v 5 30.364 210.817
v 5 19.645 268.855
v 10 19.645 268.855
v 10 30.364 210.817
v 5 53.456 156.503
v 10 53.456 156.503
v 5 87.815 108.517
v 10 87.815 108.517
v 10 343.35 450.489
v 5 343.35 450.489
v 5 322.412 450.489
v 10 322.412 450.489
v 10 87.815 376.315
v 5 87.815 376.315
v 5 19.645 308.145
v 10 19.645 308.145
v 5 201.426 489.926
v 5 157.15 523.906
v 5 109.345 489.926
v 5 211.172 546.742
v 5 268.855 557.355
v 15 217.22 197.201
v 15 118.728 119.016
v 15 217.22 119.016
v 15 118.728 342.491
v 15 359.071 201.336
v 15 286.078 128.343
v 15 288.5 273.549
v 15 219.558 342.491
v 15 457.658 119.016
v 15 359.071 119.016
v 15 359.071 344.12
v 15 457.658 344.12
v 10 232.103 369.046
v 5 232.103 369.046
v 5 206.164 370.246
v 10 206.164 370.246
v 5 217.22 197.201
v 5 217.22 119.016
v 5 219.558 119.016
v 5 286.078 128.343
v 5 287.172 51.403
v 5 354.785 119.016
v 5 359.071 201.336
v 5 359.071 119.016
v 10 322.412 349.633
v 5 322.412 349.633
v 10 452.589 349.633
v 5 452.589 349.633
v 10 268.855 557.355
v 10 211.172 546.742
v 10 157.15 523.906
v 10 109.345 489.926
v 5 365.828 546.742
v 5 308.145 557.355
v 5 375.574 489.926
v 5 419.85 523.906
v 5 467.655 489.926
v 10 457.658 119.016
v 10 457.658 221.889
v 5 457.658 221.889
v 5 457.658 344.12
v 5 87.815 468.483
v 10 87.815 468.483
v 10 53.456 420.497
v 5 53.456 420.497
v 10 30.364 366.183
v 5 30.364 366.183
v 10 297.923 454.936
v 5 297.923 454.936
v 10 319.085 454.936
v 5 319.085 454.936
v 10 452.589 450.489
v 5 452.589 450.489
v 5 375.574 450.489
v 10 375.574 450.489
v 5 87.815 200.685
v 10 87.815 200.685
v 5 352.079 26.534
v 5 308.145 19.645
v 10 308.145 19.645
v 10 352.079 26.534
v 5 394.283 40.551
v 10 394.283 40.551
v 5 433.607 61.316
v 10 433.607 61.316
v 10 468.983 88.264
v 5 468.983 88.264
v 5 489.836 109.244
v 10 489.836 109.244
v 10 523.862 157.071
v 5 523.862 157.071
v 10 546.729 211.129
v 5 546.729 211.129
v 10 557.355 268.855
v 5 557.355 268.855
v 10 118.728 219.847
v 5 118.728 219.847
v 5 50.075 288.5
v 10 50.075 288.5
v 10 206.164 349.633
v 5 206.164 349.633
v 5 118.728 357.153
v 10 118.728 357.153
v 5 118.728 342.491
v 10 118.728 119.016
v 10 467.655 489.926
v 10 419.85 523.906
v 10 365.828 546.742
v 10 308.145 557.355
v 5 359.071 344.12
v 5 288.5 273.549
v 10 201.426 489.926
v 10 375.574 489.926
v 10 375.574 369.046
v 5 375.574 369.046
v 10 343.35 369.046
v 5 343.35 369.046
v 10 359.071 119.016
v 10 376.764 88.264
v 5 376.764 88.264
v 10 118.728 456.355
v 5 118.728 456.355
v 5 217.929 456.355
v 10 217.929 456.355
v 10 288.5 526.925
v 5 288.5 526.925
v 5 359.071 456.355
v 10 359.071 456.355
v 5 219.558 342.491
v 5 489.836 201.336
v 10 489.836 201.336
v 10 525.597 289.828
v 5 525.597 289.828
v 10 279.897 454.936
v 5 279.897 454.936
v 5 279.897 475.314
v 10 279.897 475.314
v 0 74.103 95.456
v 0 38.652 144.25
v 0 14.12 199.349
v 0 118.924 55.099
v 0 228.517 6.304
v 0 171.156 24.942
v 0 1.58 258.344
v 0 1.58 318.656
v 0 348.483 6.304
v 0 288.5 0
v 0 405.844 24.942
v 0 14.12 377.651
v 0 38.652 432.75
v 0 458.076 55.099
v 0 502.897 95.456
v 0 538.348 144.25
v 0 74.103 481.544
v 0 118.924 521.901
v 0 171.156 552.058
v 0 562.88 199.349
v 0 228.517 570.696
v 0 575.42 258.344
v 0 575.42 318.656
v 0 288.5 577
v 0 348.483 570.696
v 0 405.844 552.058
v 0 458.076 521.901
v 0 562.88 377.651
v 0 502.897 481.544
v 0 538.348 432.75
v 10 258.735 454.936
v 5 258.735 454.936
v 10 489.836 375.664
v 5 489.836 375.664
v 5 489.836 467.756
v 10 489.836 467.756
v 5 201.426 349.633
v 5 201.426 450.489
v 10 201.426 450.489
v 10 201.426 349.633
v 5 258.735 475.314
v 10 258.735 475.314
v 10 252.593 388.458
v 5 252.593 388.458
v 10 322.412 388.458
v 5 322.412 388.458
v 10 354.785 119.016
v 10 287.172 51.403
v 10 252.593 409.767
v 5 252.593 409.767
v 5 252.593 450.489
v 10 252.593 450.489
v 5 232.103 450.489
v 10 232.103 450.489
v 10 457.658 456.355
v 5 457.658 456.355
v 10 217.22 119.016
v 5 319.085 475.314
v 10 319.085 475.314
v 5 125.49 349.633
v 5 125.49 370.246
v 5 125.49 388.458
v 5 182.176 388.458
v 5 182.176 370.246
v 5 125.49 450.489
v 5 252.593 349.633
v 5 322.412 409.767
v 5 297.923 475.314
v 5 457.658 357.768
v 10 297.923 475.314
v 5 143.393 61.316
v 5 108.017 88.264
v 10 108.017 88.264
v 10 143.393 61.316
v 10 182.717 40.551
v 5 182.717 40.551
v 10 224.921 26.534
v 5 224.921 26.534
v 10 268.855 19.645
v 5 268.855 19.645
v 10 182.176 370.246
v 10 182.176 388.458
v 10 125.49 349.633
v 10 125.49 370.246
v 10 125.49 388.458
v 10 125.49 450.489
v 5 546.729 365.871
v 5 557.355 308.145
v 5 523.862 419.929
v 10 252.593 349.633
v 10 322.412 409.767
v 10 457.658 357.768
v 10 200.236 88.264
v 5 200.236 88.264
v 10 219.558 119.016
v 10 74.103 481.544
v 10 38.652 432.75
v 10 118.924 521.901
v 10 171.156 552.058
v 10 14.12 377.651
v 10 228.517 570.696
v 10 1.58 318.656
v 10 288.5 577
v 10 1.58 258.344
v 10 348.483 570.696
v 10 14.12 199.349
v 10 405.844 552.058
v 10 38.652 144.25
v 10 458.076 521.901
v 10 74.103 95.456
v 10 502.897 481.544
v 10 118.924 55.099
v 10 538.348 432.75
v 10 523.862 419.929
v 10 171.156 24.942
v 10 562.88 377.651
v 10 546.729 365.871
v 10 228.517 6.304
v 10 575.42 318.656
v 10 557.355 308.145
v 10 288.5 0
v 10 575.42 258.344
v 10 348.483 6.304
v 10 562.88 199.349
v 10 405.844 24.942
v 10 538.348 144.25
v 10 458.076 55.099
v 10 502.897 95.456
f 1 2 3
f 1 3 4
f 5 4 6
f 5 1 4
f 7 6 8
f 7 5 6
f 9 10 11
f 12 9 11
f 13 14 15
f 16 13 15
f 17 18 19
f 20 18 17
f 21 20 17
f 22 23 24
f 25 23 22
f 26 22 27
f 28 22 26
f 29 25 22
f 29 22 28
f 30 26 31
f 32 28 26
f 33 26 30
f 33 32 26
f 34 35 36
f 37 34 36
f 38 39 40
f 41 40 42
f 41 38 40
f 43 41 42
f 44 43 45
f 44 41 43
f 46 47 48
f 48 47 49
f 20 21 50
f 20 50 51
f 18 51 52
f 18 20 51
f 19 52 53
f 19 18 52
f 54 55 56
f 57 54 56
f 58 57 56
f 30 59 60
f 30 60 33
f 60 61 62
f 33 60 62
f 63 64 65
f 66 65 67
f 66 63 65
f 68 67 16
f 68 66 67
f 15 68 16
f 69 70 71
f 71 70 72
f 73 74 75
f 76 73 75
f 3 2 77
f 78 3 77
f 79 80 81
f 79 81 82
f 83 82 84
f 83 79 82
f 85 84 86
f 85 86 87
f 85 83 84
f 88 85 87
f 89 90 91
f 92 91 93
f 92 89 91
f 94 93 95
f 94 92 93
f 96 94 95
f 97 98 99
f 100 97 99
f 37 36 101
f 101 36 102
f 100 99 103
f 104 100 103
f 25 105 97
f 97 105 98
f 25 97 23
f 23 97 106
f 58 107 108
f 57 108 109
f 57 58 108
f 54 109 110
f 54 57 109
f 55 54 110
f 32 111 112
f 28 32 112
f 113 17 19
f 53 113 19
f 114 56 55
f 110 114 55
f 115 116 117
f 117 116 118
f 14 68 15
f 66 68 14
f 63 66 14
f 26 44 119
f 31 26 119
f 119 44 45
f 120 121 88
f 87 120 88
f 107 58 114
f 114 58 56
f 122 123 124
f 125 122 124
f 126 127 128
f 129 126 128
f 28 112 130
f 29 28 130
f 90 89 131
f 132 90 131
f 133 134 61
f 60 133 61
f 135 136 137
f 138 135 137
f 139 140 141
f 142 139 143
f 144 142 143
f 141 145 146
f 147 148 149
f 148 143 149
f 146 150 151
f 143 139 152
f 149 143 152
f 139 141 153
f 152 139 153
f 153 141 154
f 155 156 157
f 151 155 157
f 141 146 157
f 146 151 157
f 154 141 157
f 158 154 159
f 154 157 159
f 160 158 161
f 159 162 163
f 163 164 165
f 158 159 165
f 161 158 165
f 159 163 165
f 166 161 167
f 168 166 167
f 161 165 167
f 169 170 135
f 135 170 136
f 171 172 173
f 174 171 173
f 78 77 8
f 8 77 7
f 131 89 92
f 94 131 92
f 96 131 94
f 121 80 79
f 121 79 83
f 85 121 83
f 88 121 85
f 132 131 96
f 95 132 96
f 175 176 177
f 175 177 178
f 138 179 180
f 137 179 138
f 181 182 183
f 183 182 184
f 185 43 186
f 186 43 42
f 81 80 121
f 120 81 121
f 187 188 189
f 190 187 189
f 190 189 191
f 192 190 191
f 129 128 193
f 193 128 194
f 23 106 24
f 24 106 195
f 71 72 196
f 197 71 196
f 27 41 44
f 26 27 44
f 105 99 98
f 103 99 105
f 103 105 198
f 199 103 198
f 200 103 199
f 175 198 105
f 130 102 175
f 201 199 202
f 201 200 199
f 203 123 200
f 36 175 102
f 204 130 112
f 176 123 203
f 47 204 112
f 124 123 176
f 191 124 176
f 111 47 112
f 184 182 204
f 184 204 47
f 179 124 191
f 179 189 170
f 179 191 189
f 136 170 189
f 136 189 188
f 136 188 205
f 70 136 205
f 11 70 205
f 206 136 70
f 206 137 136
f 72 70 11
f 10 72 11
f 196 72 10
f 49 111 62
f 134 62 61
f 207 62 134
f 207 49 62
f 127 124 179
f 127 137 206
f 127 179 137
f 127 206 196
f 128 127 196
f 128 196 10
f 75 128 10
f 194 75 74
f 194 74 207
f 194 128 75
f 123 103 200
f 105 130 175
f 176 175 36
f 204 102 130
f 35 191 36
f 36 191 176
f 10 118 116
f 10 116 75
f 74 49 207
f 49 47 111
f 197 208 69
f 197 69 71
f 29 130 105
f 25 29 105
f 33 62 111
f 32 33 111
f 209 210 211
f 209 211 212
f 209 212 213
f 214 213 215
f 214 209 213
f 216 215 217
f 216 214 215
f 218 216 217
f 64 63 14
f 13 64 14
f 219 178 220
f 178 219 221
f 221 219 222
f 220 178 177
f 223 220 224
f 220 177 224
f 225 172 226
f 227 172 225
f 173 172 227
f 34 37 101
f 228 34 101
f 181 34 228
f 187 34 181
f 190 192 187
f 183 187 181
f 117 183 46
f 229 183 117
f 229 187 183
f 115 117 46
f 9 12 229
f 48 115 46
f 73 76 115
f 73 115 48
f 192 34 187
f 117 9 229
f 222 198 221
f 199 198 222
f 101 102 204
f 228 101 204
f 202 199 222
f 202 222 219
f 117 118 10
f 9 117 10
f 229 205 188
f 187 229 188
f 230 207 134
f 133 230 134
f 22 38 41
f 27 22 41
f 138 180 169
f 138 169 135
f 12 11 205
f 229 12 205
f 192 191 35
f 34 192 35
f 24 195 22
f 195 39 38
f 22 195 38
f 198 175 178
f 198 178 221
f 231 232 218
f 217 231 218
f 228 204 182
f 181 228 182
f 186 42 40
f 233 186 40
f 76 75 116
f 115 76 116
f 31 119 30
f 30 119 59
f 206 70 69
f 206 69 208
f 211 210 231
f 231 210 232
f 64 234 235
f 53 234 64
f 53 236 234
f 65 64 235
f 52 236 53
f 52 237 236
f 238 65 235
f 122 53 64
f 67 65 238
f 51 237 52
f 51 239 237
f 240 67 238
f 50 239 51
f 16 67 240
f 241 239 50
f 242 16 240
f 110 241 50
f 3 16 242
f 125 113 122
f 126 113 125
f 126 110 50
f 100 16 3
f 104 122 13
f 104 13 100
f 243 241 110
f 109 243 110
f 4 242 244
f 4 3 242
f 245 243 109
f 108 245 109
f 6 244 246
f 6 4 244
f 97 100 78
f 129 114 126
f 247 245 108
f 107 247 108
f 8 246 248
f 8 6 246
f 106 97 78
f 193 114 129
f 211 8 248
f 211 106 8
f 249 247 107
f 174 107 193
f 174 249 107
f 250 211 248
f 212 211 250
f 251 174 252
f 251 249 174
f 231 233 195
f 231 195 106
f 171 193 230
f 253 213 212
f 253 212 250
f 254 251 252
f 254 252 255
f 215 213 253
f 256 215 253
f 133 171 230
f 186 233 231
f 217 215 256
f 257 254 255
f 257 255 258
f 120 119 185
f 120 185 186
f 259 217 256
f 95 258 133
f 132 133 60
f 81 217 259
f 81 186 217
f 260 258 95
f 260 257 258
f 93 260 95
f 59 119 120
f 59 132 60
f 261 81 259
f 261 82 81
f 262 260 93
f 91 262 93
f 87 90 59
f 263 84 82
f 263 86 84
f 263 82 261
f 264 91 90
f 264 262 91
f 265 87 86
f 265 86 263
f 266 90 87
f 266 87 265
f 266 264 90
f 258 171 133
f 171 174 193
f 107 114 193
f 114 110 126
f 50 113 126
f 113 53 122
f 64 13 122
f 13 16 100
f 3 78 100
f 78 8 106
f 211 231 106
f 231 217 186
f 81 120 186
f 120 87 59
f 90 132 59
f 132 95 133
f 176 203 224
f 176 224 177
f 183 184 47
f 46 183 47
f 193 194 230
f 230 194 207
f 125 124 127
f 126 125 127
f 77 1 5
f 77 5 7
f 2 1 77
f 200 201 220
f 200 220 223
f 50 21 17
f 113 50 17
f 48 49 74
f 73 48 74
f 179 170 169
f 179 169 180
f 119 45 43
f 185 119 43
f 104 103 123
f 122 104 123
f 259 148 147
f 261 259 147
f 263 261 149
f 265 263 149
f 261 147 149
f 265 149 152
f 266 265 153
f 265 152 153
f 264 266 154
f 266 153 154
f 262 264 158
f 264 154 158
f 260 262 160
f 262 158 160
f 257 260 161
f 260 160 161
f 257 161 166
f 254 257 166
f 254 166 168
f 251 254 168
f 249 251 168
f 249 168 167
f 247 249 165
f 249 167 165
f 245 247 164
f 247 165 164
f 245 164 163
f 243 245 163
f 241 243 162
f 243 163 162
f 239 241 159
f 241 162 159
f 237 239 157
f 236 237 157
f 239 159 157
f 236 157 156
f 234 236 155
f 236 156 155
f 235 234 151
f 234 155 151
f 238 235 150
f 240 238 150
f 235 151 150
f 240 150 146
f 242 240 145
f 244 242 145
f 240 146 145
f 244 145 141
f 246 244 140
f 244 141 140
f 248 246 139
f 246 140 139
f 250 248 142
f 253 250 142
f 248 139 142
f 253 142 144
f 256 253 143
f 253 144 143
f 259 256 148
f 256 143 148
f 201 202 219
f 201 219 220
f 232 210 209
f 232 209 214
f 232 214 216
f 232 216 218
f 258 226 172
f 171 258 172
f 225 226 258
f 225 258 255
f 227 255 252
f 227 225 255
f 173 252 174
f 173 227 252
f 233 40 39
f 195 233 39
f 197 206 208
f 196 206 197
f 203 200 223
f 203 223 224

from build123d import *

# Parameters (mm, degrees)
SKETCH11_R            = 288.5
BOSS_EXTRUDE7_DEPTH   = 10
BOSS_EXTRUDE7_2_DEPTH = 10
BOSS_EXTRUDE7_3_DEPTH = 10
SKETCH11_W            = 21.16178464
SKETCH11_H            = 20.378014839
BOSS_EXTRUDE7_4_DEPTH = 10
BOSS_EXTRUDE7_5_DEPTH = 10
SKETCH11_7_W          = 21.16178464
SKETCH11_7_H          = 20.378014839
BOSS_EXTRUDE8_DEPTH   = 5
BOSS_EXTRUDE9_DEPTH   = 15


with BuildPart() as part:
    # Sketch11 → Boss-Extrude7 (new body)
    with BuildSketch(Plane.YZ):
        with Locations((288.5, 288.5)):
            Circle(SKETCH11_R)
        with BuildLine():
            ThreePointArc((109.345306024, 489.925647915), (183.537908139, 536.797513648), (268.854516394, 557.354516394))
            Line((268.854516394, 557.354516394), (201.425647915, 489.925647915))
            Line((201.425647915, 489.925647915), (109.345306024, 489.925647915))
        make_face(mode=Mode.SUBTRACT)
        with BuildLine():
            ThreePointArc((19.645483606, 308.145483606), (40.419345952, 393.973622763), (87.814555723, 468.483467205))
            Line((87.814555723, 468.483467205), (87.814555723, 376.314555723))
            Line((87.814555723, 376.314555723), (19.645483606, 308.145483606))
        make_face(mode=Mode.SUBTRACT)
        with BuildLine():
            ThreePointArc((87.814555723, 108.516532795), (40.419345952, 183.026377237), (19.645483606, 268.854516394))
            Line((19.645483606, 268.854516394), (87.814555723, 200.685444277))
            Line((87.814555723, 200.685444277), (87.814555723, 108.516532795))
        make_face(mode=Mode.SUBTRACT)
        with BuildLine():
            ThreePointArc((268.854516394, 19.645483606), (182.717255503, 40.550999239), (108.016830289, 88.263835777))
            Line((108.016830289, 88.263835777), (200.236164223, 88.263835777))
            Line((200.236164223, 88.263835777), (268.854516394, 19.645483606))
        make_face(mode=Mode.SUBTRACT)
        with BuildLine():
            ThreePointArc((468.983169711, 88.263835777), (394.282744497, 40.550999239), (308.145483606, 19.645483606))
            Line((308.145483606, 19.645483606), (376.763835777, 88.263835777))
            Line((376.763835777, 88.263835777), (468.983169711, 88.263835777))
        make_face(mode=Mode.SUBTRACT)
        with BuildLine():
            ThreePointArc((557.354516394, 268.854516394), (536.771151329, 183.475567464), (489.835656115, 109.244178369))
            Line((489.835656115, 109.244178369), (489.835656115, 201.335656115))
            Line((489.835656115, 201.335656115), (557.354516394, 268.854516394))
        make_face(mode=Mode.SUBTRACT)
        with BuildLine():
            ThreePointArc((489.835656115, 467.755821631), (536.771151329, 393.524432536), (557.354516394, 308.145483606))
            Line((557.354516394, 308.145483606), (489.835656115, 375.664343885))
            Line((489.835656115, 375.664343885), (489.835656115, 467.755821631))
        make_face(mode=Mode.SUBTRACT)
        with BuildLine():
            ThreePointArc((308.145483606, 557.354516394), (393.462091861, 536.797513648), (467.654693976, 489.925647915))
            Line((467.654693976, 489.925647915), (375.574352085, 489.925647915))
            Line((375.574352085, 489.925647915), (308.145483606, 557.354516394))
        make_face(mode=Mode.SUBTRACT)
        Polygon((457.657670049, 119.01635474), (354.785355806, 119.01635474), (287.171816153, 51.402815088), (219.558276501, 119.01635474), (118.728003632, 119.01635474), (118.728003632, 219.846627609), (50.074631241, 288.5), (118.728003632, 357.153372391), (118.728003632, 456.354802066), (217.929433307, 456.354802066), (288.5, 526.925368759), (359.070566693, 456.354802066), (457.657670049, 456.354802066), (457.657670049, 357.76769871), (525.597184912, 289.828183847), (457.657670049, 221.888668984), align=None, mode=Mode.SUBTRACT)
    extrude(amount=BOSS_EXTRUDE7_DEPTH)



with BuildPart() as body_2:
    # Sketch11 → Boss-Extrude7 2 (new body)
    with BuildSketch(Plane.YZ):
        Polygon((201.425647915, 450.488919168), (125.489898595, 450.488919168), (125.489898595, 388.458487724), (182.175584131, 388.458487724), (182.175584131, 370.245546136), (125.489898595, 370.245546136), (125.489898595, 349.632569577), (201.425647915, 349.632569577), align=None)
    extrude(amount=BOSS_EXTRUDE7_2_DEPTH)


with BuildPart() as body_3:
    # Sketch11 → Boss-Extrude7 3 (new body)
    with BuildSketch(Plane.YZ):
        Polygon((232.103371973, 369.045528651), (206.163784466, 370.245546136), (206.163784466, 349.632569577), (252.593459139, 349.632569577), (252.593459139, 388.458487724), (322.412082429, 388.458487724), (322.412082429, 349.632569577), (452.588861428, 349.632569577), (452.588861428, 450.488919168), (375.574352085, 450.488919168), (375.574352085, 369.045528651), (343.349626731, 369.045528651), (343.349626731, 450.488919168), (322.412082429, 450.488919168), (322.412082429, 409.767223909), (252.593459139, 409.767223909), (252.593459139, 450.488919168), (232.103371973, 450.488919168), align=None)
    extrude(amount=BOSS_EXTRUDE7_3_DEPTH)


with BuildPart() as body_4:
    # Sketch11 → Boss-Extrude7 4 (new body)
    with BuildSketch(Plane.YZ):
        with Locations((269.315694793, 465.124823328)):
            Rectangle(SKETCH11_W, SKETCH11_H)
    extrude(amount=BOSS_EXTRUDE7_4_DEPTH)


with BuildPart() as body_5:
    # Sketch11 → Boss-Extrude7 5 (new body)
    with BuildSketch(Plane.YZ):
        with Locations((308.504184867, 465.124823328)):
            Rectangle(SKETCH11_W, SKETCH11_H)
    extrude(amount=BOSS_EXTRUDE7_5_DEPTH)


with BuildPart() as part_1:
    add(part.part)

    add(body_2.part)  # Boss-Extrude8 merges body 2

    add(body_3.part)  # Boss-Extrude8 merges body 3

    add(body_4.part)  # Boss-Extrude8 merges body 4

    add(body_5.part)  # Boss-Extrude8 merges body 5
    # Sketch11<7> → Boss-Extrude8 (add)
    # profile 1 of 10: a face of its own
    with BuildSketch(Plane.YZ):
        with BuildLine():
            Line((201.425647915, 489.925647915), (268.854516394, 557.354516394))
            ThreePointArc((268.854516394, 557.354516394), (183.537908139, 536.797513648), (109.345306024, 489.925647915))
            Line((109.345306024, 489.925647915), (201.425647915, 489.925647915))
        make_face()
    # profile 2 of 10: a face of its own
    with BuildSketch(Plane.YZ):
        with BuildLine():
            ThreePointArc((467.654693976, 489.925647915), (393.462091861, 536.797513648), (308.145483606, 557.354516394))
            Line((308.145483606, 557.354516394), (375.574352085, 489.925647915))
            Line((375.574352085, 489.925647915), (467.654693976, 489.925647915))
        make_face()
    # profile 3 of 10: a face of its own
    with BuildSketch(Plane.YZ):
        with BuildLine():
            Line((87.814555723, 376.314555723), (87.814555723, 468.483467205))
            ThreePointArc((87.814555723, 468.483467205), (40.419345952, 393.973622763), (19.645483606, 308.145483606))
            Line((19.645483606, 308.145483606), (87.814555723, 376.314555723))
        make_face()
    # profile 4 of 10: a face of its own
    with BuildSketch(Plane.YZ):
        with BuildLine():
            ThreePointArc((557.354516394, 308.145483606), (536.771151329, 393.524432536), (489.835656115, 467.755821631))
            Line((489.835656115, 467.755821631), (489.835656115, 375.664343885))
            Line((489.835656115, 375.664343885), (557.354516394, 308.145483606))
        make_face()
    # profile 5 of 10: a face of its own
    with BuildSketch(Plane.YZ):
        with BuildLine():
            Line((87.814555723, 200.685444277), (19.645483606, 268.854516394))
            ThreePointArc((19.645483606, 268.854516394), (40.419345952, 183.026377237), (87.814555723, 108.516532795))
            Line((87.814555723, 108.516532795), (87.814555723, 200.685444277))
        make_face()
    # profile 6 of 10: a face of its own
    with BuildSketch(Plane.YZ):
        with BuildLine():
            ThreePointArc((489.835656115, 109.244178369), (536.771151329, 183.475567464), (557.354516394, 268.854516394))
            Line((557.354516394, 268.854516394), (489.835656115, 201.335656115))
            Line((489.835656115, 201.335656115), (489.835656115, 109.244178369))
        make_face()
    # profile 7 of 10: a face of its own
    with BuildSketch(Plane.YZ):
        with BuildLine():
            Line((200.236164223, 88.263835777), (108.016830289, 88.263835777))
            ThreePointArc((108.016830289, 88.263835777), (182.717255503, 40.550999239), (268.854516394, 19.645483606))
            Line((268.854516394, 19.645483606), (200.236164223, 88.263835777))
        make_face()
    # profile 8 of 10: a face of its own
    with BuildSketch(Plane.YZ):
        with BuildLine():
            ThreePointArc((308.145483606, 19.645483606), (394.282744497, 40.550999239), (468.983169711, 88.263835777))
            Line((468.983169711, 88.263835777), (376.763835777, 88.263835777))
            Line((376.763835777, 88.263835777), (308.145483606, 19.645483606))
        make_face()
    # profile 9 of 10: a face of its own
    with BuildSketch(Plane.YZ):
        Polygon((217.929433307, 456.354802066), (118.728003632, 456.354802066), (118.728003632, 357.153372391), (50.074631241, 288.5), (118.728003632, 219.846627609), (118.728003632, 342.490695719), (219.558276501, 342.490695719), (288.5, 273.54897222), (359.070566693, 344.119538913), (457.657670049, 344.119538913), (457.657670049, 221.888668984), (525.597184912, 289.828183847), (457.657670049, 357.76769871), (457.657670049, 456.354802066), (359.070566693, 456.354802066), (288.5, 526.925368759), align=None)
        Polygon((125.489898595, 388.458487724), (125.489898595, 450.488919168), (201.425647915, 450.488919168), (201.425647915, 349.632569577), (125.489898595, 349.632569577), (125.489898595, 370.245546136), (182.175584131, 370.245546136), (182.175584131, 388.458487724), align=None, mode=Mode.SUBTRACT)
        with Locations((269.315694793, 465.124823328)):
            Rectangle(SKETCH11_7_W, SKETCH11_7_H, mode=Mode.SUBTRACT)
        Polygon((206.163784466, 349.632569577), (206.163784466, 370.245546136), (232.103371973, 369.045528651), (232.103371973, 450.488919168), (252.593459139, 450.488919168), (252.593459139, 409.767223909), (322.412082429, 409.767223909), (322.412082429, 450.488919168), (343.349626731, 450.488919168), (343.349626731, 369.045528651), (375.574352085, 369.045528651), (375.574352085, 450.488919168), (452.588861428, 450.488919168), (452.588861428, 349.632569577), (322.412082429, 349.632569577), (322.412082429, 388.458487724), (252.593459139, 388.458487724), (252.593459139, 349.632569577), align=None, mode=Mode.SUBTRACT)
        with Locations((308.504184867, 465.124823328)):
            Rectangle(SKETCH11_7_W, SKETCH11_7_H, mode=Mode.SUBTRACT)
    # profile 10 of 10: a face of its own
    with BuildSketch(Plane.YZ):
        Polygon((217.219769177, 197.201333657), (217.219769177, 119.01635474), (219.558276501, 119.01635474), (287.171816153, 51.402815088), (354.785355806, 119.01635474), (359.070566693, 119.01635474), (359.070566693, 201.335656115), (286.078006706, 128.343096128), align=None)
    extrude(amount=BOSS_EXTRUDE8_DEPTH)

    # Sketch11<8> → Boss-Extrude9 (add)
    with BuildSketch(Plane.YZ):
        Polygon((118.728003632, 342.490695719), (118.728003632, 219.846627609), (118.728003632, 119.01635474), (217.219769177, 119.01635474), (217.219769177, 197.201333657), (286.078006706, 128.343096128), (359.070566693, 201.335656115), (359.070566693, 119.01635474), (457.657670049, 119.01635474), (457.657670049, 221.888668984), (457.657670049, 344.119538913), (359.070566693, 344.119538913), (288.5, 273.54897222), (219.558276501, 342.490695719), align=None)
    extrude(amount=BOSS_EXTRUDE9_DEPTH)


solid = part_1.part
